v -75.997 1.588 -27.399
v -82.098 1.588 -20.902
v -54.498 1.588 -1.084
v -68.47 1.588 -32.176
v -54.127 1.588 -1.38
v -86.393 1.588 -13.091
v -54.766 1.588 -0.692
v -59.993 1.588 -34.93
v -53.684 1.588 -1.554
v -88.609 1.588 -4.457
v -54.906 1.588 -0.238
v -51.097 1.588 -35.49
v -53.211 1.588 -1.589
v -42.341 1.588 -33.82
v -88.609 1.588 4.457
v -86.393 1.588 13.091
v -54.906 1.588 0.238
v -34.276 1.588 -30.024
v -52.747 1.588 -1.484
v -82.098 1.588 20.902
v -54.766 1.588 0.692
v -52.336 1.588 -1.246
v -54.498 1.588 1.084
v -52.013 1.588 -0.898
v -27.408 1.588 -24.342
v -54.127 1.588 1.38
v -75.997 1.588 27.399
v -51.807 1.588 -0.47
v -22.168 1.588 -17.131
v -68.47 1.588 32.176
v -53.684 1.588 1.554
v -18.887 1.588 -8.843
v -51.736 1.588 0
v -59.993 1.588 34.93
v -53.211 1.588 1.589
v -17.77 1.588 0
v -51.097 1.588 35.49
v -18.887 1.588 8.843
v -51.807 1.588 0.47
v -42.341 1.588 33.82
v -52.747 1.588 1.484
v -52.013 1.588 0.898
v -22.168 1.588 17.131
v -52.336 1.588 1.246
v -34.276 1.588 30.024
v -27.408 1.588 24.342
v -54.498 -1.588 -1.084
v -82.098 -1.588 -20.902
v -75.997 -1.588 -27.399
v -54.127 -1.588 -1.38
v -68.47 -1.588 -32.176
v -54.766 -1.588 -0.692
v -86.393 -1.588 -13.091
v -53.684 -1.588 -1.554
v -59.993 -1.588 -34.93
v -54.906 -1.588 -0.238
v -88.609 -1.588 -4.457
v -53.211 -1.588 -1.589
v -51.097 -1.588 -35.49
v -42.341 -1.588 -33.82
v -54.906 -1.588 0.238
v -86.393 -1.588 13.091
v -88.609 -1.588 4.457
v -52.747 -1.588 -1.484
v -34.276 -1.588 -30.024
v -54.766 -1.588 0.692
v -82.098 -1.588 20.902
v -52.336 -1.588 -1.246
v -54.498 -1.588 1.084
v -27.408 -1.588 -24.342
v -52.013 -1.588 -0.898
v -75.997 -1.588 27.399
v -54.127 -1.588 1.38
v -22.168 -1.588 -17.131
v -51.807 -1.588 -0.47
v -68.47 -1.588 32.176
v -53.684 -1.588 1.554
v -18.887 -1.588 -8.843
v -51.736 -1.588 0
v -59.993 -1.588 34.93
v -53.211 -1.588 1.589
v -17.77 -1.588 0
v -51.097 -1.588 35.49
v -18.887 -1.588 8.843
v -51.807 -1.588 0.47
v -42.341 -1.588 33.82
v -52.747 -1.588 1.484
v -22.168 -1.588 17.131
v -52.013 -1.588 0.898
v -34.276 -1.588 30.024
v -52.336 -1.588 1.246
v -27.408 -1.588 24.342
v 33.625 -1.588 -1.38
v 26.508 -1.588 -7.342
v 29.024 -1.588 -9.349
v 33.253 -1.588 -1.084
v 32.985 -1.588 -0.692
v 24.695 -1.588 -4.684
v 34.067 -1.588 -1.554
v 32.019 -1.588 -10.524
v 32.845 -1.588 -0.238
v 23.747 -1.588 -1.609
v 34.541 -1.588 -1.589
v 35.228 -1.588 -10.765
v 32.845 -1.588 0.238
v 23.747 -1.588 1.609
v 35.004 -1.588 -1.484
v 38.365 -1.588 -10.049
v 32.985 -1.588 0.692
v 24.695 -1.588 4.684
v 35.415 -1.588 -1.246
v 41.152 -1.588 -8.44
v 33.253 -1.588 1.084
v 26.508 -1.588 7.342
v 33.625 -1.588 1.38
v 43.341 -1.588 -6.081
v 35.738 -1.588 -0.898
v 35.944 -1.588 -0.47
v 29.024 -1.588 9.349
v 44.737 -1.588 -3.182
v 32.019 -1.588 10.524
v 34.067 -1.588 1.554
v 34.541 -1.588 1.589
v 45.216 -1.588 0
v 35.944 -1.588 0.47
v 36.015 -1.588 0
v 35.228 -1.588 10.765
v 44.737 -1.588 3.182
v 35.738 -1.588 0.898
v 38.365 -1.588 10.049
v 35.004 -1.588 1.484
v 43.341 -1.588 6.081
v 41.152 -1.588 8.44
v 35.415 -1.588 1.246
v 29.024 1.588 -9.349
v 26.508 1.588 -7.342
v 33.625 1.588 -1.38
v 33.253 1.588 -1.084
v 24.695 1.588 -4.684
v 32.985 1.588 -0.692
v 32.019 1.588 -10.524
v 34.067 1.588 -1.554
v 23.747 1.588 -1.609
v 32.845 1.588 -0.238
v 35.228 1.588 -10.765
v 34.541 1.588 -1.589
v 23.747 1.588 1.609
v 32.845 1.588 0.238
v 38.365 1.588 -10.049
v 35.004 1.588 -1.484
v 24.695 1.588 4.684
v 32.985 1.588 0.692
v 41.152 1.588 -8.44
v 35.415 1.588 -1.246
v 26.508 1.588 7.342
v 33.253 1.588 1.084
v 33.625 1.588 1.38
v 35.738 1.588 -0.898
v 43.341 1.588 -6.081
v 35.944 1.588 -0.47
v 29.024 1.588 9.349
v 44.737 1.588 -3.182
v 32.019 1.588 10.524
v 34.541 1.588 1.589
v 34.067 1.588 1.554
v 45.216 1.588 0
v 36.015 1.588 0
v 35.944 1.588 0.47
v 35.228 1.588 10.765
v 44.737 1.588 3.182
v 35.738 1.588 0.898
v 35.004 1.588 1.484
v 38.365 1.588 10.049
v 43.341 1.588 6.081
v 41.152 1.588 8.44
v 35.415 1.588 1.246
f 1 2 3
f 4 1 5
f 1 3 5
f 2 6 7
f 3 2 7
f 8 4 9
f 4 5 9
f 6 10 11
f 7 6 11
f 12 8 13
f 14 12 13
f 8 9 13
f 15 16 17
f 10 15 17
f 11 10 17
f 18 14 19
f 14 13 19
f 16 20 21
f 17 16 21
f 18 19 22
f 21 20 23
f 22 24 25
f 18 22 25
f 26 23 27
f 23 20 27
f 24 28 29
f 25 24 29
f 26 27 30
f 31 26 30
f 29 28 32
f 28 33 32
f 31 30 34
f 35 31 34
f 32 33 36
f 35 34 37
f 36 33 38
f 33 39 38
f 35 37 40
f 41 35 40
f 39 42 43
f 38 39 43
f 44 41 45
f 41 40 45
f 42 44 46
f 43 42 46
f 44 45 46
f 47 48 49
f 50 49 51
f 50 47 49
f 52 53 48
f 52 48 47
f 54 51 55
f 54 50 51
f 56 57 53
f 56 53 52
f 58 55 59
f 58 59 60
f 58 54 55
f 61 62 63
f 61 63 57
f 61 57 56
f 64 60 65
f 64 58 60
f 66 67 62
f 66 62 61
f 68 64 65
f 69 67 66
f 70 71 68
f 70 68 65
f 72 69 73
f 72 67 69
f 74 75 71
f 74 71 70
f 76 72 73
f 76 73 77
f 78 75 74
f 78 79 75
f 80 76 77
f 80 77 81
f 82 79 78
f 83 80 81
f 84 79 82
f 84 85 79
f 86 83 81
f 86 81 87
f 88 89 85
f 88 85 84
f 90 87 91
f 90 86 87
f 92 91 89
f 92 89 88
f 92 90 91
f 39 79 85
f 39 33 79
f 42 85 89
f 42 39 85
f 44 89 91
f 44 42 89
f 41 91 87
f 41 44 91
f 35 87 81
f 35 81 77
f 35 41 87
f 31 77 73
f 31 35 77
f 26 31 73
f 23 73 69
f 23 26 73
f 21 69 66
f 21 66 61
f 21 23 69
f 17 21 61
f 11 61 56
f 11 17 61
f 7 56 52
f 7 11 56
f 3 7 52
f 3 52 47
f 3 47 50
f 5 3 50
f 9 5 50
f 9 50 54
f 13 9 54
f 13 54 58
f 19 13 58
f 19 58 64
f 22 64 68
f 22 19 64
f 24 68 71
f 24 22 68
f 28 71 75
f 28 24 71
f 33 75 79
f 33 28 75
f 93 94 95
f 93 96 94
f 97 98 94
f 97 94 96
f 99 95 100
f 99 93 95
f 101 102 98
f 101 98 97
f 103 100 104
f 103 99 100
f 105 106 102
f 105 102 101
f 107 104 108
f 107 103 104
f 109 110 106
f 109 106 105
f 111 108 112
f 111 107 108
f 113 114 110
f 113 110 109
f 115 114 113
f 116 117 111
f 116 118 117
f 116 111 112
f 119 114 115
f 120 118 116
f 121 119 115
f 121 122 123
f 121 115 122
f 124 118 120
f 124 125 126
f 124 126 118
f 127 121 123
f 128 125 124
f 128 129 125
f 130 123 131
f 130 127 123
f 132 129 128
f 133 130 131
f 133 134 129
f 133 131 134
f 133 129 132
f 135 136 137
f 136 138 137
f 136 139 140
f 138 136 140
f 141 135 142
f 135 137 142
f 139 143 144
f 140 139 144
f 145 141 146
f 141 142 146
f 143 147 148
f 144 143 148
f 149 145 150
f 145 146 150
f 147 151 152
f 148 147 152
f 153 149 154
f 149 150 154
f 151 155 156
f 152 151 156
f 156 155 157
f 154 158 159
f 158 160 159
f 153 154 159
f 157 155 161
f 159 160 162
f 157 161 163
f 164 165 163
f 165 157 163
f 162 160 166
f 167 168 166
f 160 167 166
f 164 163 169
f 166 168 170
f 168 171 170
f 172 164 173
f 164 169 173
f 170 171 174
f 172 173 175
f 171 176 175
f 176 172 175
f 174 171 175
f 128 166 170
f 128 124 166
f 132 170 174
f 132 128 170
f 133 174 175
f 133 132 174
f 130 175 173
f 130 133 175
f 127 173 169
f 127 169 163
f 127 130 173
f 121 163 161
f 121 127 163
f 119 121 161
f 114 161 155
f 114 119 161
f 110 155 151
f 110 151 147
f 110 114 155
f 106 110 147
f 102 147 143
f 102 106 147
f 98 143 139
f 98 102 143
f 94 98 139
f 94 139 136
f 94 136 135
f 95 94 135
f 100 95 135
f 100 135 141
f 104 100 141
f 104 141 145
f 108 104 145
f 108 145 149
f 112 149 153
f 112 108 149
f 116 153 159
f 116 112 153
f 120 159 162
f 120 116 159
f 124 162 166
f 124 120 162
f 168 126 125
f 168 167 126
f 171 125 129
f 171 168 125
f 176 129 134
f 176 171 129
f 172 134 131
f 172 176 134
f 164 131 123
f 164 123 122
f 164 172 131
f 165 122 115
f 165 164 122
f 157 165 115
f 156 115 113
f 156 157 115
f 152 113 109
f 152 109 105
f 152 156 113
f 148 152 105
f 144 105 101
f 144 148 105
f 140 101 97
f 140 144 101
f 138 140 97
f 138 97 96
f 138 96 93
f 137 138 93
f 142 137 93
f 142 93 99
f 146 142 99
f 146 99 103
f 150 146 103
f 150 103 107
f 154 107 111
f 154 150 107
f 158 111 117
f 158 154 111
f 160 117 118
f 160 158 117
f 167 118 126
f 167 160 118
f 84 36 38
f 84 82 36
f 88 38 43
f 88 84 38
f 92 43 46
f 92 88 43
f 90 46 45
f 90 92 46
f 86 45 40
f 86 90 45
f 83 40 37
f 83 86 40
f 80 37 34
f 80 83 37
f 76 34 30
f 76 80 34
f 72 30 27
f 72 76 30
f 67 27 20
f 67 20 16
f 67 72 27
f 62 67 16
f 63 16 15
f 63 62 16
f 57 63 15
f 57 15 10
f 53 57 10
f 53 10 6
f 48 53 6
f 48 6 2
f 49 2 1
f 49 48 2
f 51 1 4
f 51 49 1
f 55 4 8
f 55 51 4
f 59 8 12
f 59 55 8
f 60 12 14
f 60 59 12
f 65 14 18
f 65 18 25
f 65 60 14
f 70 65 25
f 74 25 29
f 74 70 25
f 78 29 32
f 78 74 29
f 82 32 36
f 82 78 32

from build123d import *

# Parameters (mm, degrees)
F0_R     = 35.56
F0_R_2   = 1.59385
F1_DEPTH = 1.5875
F0_R_3   = 10.795


# Not quite as in the source:
# - a length typed as a fraction of an inch, garbled in the dataset ("3 / 203.2 mm" for 3/8 in), is restored


with BuildPart() as f1:
    # F0 (on Front) → F1 (new body, symmetric)
    with BuildSketch(Plane.XZ):
        with Locations((-53.3297125294, 0)):
            Circle(F0_R)
        with Locations((-53.3297125294, 0)):
            Circle(F0_R_2, mode=Mode.SUBTRACT)
    extrude(amount=F1_DEPTH, both=True)


with BuildPart() as f1b:
    # F0 (on Front) → F1, piece 2 (new body, symmetric)
    with BuildSketch(Plane.XZ):
        with Locations((34.4214282293, 0)):
            Circle(F0_R_3)
        with Locations((34.4214282293, 0)):
            Circle(F0_R_2, mode=Mode.SUBTRACT)
    extrude(amount=F1_DEPTH, both=True)


solid = Compound([f1.part, f1b.part])
